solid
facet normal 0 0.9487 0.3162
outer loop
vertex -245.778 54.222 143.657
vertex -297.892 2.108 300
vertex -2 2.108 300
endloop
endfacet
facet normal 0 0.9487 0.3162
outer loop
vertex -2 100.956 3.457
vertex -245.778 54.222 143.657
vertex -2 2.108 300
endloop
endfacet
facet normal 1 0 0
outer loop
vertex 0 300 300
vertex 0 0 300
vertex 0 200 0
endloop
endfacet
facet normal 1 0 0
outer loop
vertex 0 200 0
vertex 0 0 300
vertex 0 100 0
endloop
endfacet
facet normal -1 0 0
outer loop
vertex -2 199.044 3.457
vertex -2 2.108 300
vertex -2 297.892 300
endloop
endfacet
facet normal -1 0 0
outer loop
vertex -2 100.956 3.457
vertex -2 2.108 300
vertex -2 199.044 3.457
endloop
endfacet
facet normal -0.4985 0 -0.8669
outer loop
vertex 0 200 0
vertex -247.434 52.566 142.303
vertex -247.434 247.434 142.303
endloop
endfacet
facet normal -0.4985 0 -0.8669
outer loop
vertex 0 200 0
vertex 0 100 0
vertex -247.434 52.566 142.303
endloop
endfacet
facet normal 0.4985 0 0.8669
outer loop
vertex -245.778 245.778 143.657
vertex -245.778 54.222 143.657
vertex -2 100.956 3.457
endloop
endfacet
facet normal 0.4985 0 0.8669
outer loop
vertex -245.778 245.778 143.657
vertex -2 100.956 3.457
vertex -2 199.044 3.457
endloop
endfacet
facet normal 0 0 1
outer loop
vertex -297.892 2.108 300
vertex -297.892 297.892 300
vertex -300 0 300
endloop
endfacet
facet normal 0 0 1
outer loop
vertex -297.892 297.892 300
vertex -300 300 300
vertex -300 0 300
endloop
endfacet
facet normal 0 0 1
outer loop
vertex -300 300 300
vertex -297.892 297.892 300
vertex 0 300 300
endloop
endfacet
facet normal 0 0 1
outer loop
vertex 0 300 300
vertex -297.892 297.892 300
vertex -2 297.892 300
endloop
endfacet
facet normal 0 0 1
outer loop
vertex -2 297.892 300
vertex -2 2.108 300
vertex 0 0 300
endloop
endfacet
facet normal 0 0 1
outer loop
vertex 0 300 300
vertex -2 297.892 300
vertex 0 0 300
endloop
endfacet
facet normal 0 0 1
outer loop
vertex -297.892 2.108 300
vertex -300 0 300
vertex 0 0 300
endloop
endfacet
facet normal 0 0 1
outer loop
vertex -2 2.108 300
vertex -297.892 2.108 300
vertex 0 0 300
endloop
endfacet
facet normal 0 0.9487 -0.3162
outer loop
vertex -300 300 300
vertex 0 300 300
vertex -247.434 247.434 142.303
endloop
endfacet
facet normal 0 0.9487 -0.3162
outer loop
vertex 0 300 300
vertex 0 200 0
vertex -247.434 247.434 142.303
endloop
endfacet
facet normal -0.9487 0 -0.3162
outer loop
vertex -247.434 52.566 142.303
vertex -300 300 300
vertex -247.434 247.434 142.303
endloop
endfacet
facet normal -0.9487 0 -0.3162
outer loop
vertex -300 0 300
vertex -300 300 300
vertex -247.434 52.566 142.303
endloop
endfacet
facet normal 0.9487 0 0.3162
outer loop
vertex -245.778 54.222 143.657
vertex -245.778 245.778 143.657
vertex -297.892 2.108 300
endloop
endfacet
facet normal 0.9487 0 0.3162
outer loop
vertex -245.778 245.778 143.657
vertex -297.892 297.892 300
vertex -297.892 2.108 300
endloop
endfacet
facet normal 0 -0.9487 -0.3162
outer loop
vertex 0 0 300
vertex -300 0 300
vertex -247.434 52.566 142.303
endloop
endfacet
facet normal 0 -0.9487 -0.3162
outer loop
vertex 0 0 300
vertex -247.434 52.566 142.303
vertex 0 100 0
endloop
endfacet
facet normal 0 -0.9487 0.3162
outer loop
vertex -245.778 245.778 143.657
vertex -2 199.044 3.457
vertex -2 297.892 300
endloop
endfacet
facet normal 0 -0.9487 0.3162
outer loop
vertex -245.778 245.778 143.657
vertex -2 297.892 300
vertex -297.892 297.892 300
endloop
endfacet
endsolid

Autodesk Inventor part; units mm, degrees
ref_plane "YZ Plane" through (0, 0, 0) normal (1, 0, 0) x (0, 1, 0)
ref_plane "XZ Plane" through (0, 0, 0) normal (0, 1, 0) x (-1, 0, 0)
ref_plane "XY Plane" through (0, 0, 0) normal (0, 0, 1) x (1, 0, 0)
sketch "Sketch1" plane through (0, 0, 0) normal (0, 1, 0) x (-1, 0, 0)
  line L0 (0, 0) -> (300, 0)
  line L1 (300, 0) -> (300, 300)
  line L2 (300, 300) -> (0, 300)
  line L3 (0, 300) -> (0, 0)
  dimension "d0" = 300
  dimension "d1" = 300
extrude "Extrusion1" add sketch "Sketch1" along normal blind 300
chamfer "Chamfer1" distance 100 distance2 300 1 edges at (-300, 150, 0) measured on face at (-100, 100, 0)
chamfer "Chamfer2" distance 100 distance2 300 1 edges at (-100, 0, 0) measured on face at (-66.6667, 100, 0)
chamfer "Chamfer3" distance 300 distance2 100 1 edges at (-100, 300, 0) measured on face at (-166.6667, 300, 200)
chamfer "Chamfer4" distance 150 distance2 200 1 edges at (-200.0001, 150, 0) measured on face at (-266.6667, 166.6667, 199.9999)
shell "Shell1" thickness 2 removed faces 1 at (-200, 100, 300)
properties part number "hopper"
